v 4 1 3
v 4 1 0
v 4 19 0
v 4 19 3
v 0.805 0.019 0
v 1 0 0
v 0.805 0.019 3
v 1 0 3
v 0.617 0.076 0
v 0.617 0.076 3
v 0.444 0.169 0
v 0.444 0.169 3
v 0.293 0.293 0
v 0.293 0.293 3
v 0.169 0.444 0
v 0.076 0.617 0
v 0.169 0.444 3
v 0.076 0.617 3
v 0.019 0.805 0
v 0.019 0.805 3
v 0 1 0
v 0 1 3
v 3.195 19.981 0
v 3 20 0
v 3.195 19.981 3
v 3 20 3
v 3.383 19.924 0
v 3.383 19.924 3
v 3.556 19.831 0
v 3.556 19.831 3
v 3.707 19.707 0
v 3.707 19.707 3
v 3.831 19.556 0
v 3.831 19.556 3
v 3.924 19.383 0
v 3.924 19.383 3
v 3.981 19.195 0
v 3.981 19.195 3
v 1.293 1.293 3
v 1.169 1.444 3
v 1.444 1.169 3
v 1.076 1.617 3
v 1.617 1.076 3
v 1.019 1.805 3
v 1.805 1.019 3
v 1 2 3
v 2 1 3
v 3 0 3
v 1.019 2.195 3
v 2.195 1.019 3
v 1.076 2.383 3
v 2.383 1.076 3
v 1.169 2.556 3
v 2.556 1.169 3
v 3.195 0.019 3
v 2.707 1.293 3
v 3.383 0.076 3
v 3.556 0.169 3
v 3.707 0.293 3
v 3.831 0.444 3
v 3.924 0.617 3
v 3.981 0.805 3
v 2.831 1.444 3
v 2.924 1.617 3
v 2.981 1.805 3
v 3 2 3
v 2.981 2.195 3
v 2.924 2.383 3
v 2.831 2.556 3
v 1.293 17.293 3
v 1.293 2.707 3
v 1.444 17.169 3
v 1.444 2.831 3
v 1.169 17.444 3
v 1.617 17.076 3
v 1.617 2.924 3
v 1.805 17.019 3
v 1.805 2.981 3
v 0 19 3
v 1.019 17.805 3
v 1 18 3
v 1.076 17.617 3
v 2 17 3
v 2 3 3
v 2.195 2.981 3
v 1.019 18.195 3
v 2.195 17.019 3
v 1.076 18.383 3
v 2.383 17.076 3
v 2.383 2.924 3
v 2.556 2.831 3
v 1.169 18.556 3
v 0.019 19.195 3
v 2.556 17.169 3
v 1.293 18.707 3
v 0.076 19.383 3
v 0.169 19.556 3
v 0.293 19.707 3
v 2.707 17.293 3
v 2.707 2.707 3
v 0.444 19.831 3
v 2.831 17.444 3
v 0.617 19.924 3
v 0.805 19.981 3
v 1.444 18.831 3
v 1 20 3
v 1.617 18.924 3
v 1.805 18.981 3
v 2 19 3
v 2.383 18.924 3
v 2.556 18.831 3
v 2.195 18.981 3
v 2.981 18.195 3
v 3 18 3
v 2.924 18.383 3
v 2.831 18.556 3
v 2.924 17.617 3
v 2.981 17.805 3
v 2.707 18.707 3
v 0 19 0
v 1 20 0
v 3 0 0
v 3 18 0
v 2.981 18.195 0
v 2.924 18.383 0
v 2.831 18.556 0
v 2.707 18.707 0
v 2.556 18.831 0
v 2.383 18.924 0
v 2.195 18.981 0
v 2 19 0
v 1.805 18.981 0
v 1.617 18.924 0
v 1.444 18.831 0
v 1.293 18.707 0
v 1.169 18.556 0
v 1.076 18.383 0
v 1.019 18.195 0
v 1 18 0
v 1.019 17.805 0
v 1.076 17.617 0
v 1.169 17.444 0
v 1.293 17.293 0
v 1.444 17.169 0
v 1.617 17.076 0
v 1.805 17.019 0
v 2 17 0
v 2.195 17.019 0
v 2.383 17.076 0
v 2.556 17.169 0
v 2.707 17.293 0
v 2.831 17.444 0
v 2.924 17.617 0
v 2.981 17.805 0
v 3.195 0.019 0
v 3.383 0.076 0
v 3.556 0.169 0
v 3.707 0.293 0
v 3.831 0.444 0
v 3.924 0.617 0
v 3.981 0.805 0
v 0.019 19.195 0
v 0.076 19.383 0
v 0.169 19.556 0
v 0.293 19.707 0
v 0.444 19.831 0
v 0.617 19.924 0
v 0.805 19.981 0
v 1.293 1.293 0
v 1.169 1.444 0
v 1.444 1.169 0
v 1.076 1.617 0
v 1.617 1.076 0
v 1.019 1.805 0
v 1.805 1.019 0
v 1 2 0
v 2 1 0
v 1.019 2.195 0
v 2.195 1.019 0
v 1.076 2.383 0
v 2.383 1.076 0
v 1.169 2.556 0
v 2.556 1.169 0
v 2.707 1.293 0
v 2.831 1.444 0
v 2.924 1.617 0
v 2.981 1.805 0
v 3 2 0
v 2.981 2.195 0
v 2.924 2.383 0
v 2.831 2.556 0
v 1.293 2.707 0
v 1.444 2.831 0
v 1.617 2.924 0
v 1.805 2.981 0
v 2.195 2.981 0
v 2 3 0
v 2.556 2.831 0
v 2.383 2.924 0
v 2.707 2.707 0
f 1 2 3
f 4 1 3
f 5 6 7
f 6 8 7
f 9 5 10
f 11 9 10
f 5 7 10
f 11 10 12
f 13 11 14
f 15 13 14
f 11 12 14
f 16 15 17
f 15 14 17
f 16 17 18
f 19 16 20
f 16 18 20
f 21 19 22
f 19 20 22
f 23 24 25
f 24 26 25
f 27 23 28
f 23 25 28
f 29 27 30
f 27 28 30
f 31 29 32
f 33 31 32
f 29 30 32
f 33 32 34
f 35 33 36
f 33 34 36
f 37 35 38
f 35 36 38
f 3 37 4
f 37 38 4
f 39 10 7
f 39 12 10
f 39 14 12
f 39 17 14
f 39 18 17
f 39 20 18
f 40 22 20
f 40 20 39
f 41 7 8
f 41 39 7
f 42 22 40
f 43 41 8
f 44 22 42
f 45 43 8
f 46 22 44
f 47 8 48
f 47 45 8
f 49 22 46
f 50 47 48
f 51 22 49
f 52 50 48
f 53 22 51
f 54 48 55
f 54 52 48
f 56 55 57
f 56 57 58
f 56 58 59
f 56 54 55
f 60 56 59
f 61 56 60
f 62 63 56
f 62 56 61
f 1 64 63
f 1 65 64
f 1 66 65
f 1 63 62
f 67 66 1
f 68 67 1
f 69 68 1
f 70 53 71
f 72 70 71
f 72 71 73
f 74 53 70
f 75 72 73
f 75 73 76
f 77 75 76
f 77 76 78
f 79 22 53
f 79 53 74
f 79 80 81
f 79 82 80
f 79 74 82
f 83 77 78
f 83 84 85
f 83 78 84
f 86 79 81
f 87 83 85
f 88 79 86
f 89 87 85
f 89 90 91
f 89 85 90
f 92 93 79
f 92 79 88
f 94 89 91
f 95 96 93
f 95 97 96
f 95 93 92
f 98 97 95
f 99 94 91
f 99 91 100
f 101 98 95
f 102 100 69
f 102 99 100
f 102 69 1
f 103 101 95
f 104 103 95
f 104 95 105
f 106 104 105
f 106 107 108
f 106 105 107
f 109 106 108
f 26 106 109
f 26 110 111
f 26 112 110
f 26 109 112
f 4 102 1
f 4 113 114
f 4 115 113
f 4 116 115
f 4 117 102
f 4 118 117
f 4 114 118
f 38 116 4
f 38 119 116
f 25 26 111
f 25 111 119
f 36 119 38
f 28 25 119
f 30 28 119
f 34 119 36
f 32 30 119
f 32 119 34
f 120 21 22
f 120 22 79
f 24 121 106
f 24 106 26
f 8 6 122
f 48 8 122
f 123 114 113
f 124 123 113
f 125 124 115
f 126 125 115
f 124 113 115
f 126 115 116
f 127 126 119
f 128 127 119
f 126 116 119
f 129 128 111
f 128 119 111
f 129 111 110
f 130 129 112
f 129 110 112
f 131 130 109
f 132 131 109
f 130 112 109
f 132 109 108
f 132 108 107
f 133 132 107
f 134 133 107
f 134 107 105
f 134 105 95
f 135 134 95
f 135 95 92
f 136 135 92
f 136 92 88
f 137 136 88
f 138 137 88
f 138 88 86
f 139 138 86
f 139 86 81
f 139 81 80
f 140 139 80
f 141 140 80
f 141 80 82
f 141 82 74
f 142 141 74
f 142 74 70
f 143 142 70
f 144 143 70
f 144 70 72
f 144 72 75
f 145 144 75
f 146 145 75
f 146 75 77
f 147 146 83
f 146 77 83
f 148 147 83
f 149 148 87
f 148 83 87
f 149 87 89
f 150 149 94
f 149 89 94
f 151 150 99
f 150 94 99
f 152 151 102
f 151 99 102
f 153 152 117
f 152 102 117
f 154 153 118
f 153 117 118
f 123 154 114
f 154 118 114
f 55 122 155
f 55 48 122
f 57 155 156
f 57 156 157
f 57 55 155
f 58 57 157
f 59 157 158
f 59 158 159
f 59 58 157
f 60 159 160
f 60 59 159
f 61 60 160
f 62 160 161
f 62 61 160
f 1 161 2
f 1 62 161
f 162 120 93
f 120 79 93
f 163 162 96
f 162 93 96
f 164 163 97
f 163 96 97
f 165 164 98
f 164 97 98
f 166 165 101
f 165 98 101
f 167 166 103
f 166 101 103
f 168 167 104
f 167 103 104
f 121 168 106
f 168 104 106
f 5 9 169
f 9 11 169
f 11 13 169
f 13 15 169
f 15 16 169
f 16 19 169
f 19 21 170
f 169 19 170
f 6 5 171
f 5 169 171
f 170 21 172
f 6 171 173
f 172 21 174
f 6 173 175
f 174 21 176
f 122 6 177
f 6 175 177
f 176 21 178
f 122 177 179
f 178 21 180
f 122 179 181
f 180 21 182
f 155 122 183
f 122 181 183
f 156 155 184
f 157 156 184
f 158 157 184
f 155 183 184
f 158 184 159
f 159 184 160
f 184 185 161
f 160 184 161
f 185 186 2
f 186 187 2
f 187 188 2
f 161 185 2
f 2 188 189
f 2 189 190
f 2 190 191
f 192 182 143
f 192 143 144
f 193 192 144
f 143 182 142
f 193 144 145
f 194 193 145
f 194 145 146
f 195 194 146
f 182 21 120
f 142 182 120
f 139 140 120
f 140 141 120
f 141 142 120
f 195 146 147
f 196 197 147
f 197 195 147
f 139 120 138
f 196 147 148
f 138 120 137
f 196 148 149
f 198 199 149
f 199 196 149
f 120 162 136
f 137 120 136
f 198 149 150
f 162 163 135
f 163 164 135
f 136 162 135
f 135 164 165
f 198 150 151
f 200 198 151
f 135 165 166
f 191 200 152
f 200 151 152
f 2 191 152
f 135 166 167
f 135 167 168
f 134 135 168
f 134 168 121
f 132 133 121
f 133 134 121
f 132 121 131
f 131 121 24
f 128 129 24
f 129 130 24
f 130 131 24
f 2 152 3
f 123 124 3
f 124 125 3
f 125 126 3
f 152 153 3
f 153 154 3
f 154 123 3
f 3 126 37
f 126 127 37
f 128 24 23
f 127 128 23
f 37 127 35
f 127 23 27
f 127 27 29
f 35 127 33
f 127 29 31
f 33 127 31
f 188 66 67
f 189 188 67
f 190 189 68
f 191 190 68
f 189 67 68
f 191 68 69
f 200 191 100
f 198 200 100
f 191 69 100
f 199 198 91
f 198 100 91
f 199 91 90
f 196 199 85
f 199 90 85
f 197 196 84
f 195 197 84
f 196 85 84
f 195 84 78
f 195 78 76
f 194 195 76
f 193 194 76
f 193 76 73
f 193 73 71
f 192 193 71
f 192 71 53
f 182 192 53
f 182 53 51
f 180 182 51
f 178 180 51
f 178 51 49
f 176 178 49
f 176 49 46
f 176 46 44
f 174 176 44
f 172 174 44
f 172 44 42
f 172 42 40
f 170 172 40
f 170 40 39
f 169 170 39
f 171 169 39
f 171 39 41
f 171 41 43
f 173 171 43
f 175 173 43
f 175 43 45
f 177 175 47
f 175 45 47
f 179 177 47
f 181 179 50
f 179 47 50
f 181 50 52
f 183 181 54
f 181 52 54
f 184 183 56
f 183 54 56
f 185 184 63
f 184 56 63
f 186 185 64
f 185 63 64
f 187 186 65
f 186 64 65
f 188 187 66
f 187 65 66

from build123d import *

# Parameters (mm, degrees)
ESQUISSE1_W             = 4
ESQUISSE1_H             = 20
BOSS_EXTRU_1_DEPTH      = 3
ESQUISSE3_R             = 1
ENL_V_MAT_EXTRU_1_DEPTH = 6
CONG_4_R                = 1
CONG_5_R                = 1
CONG_6_R                = 1
CONG_7_R                = 1


with BuildPart() as part:
    # Esquisse1 → Boss.-Extru.1 (new body)
    with BuildSketch(Plane.XY):
        with Locations((2, 10)):
            Rectangle(ESQUISSE1_W, ESQUISSE1_H)
    extrude(amount=BOSS_EXTRU_1_DEPTH)

    # Esquisse3 → Enlèv. mat.-Extru.1 (cut)
    with BuildSketch(Plane.XY.offset(3)):
        with Locations((2, 2)):
            Circle(ESQUISSE3_R)
        with Locations((2, 18)):
            Circle(ESQUISSE3_R)
    extrude(amount=-ENL_V_MAT_EXTRU_1_DEPTH, mode=Mode.SUBTRACT)

    # Congé4
    cong_4_edges = [part.edges().sort_by_distance(p)[0] for p in [
        (4, 0, 1.5),
    ]]
    fillet(cong_4_edges, radius=CONG_4_R)

    # Congé5
    cong_5_edges = [part.edges().sort_by_distance(p)[0] for p in [
        (0, 0, 1.5),
    ]]
    fillet(cong_5_edges, radius=CONG_5_R)

    # Congé6
    cong_6_edges = [part.edges().sort_by_distance(p)[0] for p in [
        (0, 20, 1.5),
    ]]
    fillet(cong_6_edges, radius=CONG_6_R)

    # Congé7
    cong_7_edges = [part.edges().sort_by_distance(p)[0] for p in [
        (4, 20, 1.5),
    ]]
    fillet(cong_7_edges, radius=CONG_7_R)


solid = part.part
